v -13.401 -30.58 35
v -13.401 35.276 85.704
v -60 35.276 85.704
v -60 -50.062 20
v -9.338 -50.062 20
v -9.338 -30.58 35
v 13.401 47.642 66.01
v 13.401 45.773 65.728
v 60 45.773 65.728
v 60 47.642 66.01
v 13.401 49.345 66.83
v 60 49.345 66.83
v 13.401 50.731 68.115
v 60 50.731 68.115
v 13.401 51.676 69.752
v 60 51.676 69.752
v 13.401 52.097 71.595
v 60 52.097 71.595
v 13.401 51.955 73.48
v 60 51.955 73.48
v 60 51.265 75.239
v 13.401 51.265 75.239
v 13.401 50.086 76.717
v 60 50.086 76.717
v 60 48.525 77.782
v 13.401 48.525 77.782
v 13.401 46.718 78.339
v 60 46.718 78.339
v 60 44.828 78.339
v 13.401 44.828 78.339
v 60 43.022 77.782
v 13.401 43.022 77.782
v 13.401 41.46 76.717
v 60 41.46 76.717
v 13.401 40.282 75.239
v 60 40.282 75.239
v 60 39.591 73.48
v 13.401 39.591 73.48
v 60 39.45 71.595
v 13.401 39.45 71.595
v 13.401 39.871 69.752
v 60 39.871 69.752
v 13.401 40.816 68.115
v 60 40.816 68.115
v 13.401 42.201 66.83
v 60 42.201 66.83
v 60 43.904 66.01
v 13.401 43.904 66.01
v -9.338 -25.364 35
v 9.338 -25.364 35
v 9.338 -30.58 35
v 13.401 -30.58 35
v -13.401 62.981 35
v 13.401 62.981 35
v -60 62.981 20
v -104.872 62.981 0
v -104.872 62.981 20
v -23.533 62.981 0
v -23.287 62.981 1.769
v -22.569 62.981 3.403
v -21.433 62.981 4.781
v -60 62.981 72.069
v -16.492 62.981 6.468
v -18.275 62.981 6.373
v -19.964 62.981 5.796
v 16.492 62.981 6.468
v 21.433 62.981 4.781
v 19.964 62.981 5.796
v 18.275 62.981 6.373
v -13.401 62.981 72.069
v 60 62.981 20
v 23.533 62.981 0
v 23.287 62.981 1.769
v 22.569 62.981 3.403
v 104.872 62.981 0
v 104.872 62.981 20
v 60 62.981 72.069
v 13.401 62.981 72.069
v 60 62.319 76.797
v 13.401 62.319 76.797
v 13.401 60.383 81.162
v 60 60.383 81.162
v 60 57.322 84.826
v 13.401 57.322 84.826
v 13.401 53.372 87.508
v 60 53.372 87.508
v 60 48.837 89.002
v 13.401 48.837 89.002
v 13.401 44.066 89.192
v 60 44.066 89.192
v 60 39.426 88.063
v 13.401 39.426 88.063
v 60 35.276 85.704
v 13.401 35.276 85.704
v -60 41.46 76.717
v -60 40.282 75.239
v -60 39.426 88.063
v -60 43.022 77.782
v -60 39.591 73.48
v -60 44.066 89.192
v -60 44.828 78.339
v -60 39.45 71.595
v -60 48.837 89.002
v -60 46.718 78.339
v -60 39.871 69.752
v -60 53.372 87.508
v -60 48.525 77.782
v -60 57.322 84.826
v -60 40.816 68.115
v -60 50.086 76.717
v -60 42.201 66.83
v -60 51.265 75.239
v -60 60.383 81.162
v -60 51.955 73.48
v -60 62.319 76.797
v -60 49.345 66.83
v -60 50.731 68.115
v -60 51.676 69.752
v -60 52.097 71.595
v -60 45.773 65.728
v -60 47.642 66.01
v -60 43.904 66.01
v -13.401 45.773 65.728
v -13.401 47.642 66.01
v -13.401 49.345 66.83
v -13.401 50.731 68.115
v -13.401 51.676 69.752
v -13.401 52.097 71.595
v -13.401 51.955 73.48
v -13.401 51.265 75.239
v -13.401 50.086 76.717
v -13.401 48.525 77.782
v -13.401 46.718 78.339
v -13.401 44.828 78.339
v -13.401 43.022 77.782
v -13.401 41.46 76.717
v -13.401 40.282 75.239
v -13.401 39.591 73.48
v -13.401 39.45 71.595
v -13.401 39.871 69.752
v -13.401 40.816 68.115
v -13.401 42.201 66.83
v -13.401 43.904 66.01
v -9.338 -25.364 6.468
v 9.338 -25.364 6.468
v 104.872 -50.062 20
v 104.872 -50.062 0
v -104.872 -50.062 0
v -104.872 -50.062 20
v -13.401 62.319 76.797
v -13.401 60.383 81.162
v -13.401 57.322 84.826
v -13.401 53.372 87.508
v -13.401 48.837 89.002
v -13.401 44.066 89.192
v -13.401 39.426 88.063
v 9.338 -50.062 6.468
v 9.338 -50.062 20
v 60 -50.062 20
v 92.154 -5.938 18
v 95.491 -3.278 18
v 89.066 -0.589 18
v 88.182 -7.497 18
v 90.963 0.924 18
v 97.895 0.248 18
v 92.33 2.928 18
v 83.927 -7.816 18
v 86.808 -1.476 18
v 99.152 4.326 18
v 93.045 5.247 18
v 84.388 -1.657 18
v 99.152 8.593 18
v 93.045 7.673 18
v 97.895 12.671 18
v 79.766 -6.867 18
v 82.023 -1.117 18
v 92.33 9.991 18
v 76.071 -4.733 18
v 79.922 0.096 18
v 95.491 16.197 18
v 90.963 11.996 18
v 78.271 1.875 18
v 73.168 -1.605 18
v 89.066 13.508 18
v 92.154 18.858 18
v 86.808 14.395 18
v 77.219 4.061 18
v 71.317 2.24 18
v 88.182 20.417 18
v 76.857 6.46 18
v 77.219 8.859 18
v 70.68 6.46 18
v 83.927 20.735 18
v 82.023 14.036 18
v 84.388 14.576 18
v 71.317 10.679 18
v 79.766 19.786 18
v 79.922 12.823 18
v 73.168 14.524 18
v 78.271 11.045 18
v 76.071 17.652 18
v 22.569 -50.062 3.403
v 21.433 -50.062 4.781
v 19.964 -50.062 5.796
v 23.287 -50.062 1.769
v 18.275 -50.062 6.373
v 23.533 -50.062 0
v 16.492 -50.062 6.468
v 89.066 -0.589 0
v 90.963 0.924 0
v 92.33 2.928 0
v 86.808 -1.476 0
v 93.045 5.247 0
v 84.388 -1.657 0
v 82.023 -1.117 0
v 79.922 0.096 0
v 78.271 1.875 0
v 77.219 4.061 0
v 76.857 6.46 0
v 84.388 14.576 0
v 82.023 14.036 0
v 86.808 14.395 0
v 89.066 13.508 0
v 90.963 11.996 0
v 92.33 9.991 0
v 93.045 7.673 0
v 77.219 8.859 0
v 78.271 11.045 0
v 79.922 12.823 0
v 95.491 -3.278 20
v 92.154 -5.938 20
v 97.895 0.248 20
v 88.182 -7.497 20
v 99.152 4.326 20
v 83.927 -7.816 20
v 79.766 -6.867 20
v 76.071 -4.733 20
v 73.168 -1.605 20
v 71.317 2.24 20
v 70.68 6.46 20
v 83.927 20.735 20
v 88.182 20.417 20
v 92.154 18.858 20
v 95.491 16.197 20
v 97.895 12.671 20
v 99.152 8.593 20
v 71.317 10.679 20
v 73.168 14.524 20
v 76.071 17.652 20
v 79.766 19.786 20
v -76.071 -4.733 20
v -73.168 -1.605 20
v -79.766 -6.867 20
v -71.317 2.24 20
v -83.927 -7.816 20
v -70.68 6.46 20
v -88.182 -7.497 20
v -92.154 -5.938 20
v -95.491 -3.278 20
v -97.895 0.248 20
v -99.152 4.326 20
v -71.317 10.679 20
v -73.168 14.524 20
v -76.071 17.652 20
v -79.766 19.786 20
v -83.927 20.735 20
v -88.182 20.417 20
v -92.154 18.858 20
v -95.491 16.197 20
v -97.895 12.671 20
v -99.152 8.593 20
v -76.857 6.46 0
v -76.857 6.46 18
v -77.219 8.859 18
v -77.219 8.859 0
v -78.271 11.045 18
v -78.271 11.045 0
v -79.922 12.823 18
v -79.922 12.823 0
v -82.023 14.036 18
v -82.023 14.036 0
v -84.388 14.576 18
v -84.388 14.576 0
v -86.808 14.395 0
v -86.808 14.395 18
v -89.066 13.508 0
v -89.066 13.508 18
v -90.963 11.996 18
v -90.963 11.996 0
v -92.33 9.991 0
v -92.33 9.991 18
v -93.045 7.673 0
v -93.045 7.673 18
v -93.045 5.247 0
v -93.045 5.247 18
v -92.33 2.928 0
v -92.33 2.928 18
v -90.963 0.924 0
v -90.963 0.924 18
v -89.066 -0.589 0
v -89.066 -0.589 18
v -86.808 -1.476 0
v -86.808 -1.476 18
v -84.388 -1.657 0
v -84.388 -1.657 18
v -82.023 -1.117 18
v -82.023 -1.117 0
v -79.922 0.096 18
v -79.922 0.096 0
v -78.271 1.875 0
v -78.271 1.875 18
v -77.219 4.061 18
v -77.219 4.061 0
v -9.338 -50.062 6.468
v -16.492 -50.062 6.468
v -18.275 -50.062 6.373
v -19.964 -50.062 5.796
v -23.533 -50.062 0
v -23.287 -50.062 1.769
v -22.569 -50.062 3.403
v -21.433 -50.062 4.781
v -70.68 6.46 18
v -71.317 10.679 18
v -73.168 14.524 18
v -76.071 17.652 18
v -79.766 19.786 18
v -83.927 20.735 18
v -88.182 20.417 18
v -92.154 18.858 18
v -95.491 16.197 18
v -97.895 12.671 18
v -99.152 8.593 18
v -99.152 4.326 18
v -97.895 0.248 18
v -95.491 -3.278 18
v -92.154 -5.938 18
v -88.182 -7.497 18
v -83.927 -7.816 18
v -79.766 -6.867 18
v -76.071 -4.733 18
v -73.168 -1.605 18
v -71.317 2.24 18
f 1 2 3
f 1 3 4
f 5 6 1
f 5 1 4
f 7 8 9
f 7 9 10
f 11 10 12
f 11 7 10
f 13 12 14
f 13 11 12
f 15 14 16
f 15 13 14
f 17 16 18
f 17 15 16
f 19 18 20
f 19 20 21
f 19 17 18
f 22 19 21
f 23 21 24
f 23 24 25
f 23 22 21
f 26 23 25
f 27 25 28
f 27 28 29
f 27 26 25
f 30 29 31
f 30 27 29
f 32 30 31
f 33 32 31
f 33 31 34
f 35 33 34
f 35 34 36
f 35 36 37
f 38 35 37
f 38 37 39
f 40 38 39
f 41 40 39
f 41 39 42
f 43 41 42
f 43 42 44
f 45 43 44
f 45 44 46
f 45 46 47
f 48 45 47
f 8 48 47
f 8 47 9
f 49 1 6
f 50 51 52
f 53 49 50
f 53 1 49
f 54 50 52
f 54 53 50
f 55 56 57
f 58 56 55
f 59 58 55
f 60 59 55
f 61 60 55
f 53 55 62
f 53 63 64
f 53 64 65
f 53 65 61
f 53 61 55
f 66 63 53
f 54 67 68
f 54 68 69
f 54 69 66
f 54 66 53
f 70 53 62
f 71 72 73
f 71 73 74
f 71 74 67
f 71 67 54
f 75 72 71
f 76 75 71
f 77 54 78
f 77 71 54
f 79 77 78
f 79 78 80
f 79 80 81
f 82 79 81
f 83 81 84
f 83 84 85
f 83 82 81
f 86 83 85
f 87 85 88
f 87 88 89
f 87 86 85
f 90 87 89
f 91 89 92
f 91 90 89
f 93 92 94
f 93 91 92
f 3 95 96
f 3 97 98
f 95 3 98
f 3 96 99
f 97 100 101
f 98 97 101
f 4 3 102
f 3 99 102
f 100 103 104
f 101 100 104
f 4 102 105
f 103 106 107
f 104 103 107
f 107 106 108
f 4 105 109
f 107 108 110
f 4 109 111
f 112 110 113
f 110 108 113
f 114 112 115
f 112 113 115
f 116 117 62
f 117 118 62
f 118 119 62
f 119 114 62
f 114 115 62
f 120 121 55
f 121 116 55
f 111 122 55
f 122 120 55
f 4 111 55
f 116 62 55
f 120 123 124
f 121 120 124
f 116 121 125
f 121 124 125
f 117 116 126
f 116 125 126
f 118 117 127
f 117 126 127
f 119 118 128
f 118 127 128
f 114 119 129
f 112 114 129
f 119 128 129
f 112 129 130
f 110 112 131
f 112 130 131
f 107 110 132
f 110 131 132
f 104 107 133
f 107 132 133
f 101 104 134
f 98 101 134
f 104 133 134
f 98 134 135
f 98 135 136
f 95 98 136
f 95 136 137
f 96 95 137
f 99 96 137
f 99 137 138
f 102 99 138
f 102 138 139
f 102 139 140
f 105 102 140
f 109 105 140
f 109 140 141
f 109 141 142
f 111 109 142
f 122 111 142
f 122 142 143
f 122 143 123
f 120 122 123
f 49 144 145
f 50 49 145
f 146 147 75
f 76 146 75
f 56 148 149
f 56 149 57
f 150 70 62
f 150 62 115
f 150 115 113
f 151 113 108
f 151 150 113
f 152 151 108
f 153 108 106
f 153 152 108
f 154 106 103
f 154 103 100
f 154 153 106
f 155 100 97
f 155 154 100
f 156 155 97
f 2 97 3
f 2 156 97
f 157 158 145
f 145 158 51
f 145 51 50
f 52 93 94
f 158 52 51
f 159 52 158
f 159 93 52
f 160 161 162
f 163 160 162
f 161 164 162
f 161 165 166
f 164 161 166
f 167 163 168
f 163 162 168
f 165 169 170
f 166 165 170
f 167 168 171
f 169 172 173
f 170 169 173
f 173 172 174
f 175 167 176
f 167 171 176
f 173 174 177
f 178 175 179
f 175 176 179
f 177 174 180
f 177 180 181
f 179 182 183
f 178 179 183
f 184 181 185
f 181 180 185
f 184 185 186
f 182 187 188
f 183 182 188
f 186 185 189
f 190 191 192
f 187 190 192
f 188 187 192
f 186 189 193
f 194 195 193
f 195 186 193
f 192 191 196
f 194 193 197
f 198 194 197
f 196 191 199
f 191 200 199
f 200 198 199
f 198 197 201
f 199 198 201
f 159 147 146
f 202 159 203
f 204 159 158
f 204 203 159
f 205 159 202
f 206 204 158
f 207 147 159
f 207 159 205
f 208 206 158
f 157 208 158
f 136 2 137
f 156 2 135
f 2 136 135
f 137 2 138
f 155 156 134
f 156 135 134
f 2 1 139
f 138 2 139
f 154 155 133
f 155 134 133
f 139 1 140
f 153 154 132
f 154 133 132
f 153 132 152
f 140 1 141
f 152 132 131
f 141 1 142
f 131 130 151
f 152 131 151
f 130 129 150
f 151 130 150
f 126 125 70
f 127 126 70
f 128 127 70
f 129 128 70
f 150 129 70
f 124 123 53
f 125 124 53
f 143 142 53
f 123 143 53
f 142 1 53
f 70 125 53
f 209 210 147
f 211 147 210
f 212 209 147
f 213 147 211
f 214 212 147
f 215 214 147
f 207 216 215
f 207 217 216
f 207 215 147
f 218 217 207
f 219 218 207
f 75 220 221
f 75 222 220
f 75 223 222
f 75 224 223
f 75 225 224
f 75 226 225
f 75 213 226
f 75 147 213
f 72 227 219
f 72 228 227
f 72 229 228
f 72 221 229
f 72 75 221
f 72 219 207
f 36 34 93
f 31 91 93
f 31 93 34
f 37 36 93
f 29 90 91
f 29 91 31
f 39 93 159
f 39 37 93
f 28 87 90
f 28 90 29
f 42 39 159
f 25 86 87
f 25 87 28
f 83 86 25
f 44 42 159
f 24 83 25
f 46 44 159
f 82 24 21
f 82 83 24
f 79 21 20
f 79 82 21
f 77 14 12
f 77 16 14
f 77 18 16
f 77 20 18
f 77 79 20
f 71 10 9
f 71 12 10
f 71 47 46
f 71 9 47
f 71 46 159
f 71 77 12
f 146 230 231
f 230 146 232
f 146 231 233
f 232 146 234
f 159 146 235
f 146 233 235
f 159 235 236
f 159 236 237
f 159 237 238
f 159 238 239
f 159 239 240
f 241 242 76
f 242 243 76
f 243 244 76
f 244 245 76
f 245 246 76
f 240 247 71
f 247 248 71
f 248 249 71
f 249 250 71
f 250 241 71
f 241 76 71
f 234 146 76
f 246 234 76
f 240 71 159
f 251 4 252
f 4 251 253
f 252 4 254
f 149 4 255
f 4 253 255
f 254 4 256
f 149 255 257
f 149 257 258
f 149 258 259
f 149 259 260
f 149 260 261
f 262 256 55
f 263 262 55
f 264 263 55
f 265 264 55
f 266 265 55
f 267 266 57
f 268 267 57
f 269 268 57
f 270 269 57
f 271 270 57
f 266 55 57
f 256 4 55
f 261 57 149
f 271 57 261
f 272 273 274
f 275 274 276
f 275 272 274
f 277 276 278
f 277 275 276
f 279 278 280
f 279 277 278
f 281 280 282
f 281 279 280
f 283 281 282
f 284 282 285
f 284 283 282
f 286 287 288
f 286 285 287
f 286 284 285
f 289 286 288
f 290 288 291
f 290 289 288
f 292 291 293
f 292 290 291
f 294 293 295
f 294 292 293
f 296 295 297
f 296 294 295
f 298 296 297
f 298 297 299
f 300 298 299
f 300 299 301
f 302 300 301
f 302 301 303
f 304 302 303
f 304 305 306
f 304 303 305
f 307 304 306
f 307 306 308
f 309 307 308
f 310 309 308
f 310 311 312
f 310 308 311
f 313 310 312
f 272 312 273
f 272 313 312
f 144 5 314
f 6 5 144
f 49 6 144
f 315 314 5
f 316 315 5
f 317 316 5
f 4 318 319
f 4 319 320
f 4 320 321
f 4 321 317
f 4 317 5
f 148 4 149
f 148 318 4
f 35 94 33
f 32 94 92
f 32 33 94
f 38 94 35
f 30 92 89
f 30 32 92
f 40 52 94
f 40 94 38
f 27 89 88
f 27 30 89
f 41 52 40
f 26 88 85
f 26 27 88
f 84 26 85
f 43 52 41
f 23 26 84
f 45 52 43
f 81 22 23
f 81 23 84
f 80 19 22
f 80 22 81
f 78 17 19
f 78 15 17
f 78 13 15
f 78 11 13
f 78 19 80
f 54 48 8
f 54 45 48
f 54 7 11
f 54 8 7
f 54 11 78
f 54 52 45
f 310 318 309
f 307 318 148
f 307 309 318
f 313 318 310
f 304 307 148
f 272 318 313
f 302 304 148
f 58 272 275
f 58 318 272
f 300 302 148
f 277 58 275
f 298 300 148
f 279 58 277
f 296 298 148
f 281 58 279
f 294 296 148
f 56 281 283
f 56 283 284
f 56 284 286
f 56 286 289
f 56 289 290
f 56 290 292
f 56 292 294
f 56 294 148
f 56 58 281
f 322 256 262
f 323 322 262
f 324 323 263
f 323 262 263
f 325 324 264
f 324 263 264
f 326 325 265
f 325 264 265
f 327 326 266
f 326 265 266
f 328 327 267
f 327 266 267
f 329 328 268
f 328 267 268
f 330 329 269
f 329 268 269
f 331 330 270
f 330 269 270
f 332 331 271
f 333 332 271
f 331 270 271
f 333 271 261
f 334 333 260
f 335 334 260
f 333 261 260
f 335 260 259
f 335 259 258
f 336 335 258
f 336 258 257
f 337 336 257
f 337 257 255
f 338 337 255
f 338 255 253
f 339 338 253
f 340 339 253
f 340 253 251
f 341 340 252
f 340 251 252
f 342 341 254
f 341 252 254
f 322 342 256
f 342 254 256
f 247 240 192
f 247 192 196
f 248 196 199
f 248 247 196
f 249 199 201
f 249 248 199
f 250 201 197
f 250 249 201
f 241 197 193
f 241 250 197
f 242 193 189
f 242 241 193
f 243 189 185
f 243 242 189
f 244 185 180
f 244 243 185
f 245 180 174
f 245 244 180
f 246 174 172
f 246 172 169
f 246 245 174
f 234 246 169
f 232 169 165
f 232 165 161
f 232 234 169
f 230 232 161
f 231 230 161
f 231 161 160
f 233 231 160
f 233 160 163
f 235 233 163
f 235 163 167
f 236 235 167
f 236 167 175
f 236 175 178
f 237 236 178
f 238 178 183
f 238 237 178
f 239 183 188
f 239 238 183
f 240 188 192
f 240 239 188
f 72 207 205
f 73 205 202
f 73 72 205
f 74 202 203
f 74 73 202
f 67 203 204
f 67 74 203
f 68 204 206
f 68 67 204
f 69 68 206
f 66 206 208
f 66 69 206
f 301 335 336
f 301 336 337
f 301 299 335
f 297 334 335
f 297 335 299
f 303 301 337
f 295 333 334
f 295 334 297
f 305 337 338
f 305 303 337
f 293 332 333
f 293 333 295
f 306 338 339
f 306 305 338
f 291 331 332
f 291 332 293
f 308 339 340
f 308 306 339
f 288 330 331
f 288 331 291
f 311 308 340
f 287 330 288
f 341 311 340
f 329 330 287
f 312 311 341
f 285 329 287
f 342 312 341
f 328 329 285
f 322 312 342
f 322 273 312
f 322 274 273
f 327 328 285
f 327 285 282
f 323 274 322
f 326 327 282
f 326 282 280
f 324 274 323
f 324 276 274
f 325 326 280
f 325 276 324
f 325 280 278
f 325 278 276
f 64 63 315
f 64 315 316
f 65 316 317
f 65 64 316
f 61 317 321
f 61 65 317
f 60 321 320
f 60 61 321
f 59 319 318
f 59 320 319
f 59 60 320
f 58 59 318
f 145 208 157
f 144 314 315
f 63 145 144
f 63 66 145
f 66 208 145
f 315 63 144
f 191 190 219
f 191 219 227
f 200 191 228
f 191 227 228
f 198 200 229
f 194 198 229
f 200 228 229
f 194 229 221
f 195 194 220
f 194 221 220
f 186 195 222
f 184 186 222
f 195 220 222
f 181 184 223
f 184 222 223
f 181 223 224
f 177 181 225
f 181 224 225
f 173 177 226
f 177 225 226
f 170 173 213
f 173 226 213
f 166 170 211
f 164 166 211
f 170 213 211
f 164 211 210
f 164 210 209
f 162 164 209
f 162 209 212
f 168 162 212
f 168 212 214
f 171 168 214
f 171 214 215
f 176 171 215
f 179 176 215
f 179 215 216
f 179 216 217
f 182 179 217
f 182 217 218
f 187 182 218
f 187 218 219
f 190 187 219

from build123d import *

# Parameters (mm, degrees)
SZKIC1_W                    = 104.872117299
SZKIC1_H                    = 113.043153049
SZKIC1_R                    = 8.139229877
DODANIE_WYCI_GNI_CIE1_DEPTH = 20
SZKIC2_R                    = 14.315912416
WYTNIJ_WYCI_GNI_CIE1_DEPTH  = 2
WYTNIJ_WYCI_GNI_CIE2_DEPTH  = 140
SZKIC9_R                    = 6.34096602
DODANIE_WYCI_GNI_CIE2_DEPTH = 60
SZKIC12_W                   = 26.801545634
SZKIC12_H                   = 113.043153049
WYTNIJ_WYCI_GNI_CIE8_DEPTH  = 99
SZKIC13_W                   = 18.676589494
SZKIC13_H                   = 43.251049354
WYTNIJ_WYCI_GNI_CIE9_DEPTH  = 85


with BuildPart() as part:
    # Szkic1 → Dodanie-wyciągnięcie1 (new body)
    with BuildSketch(Plane.XY):
        with Locations((-52.43605865, 6.459608746)):
            Rectangle(SZKIC1_W, SZKIC1_H)
        with Locations((-84.996398081, 6.459608746)):
            Circle(SZKIC1_R, mode=Mode.SUBTRACT)
    dodanie_wyci_gni_cie1 = extrude(amount=DODANIE_WYCI_GNI_CIE1_DEPTH)

    # Szkic2 → Wytnij-wyciągnięcie1 (cut)
    with BuildSketch(Plane.XY.offset(20)):
        with Locations((-84.996398081, 6.459608746)):
            Circle(SZKIC2_R)
    wytnij_wyci_gni_cie1 = extrude(amount=-WYTNIJ_WYCI_GNI_CIE1_DEPTH, mode=Mode.SUBTRACT)

    # Lustro2: Dodanie-wyciągnięcie1, Wytnij-wyciągnięcie1 across plane
    add(dodanie_wyci_gni_cie1.mirror(Plane(origin=(0, 62.98118527, 20), x_dir=(0, 0, 1), z_dir=(-1, 0, 0))))
    add(wytnij_wyci_gni_cie1.mirror(Plane(origin=(0, 62.98118527, 20), x_dir=(0, 0, 1), z_dir=(-1, 0, 0))), mode=Mode.SUBTRACT)

    # Szkic6 → Wytnij-wyciągnięcie2 (cut)
    with BuildSketch(Plane(origin=(0, 62.98118527, 0), x_dir=(1, 0, 0), z_dir=(0, 1, 0))):
        with BuildLine():
            Line((-23.533046442, 0), (23.533046442, 0))
            ThreePointArc((23.533046442, 0), (21.432956346, -4.78054627), (16.491575681, -6.467780152))
            Line((16.491575681, -6.467780152), (-16.491575681, -6.467780152))
            ThreePointArc((-16.491575681, -6.467780152), (-21.432956346, -4.78054627), (-23.533046442, 0))
        make_face()
    extrude(amount=-WYTNIJ_WYCI_GNI_CIE2_DEPTH, mode=Mode.SUBTRACT)

    # Szkic9 → Dodanie-wyciągnięcie2 (add)
    with BuildSketch(Plane(origin=(0, 0, 0), x_dir=(0, 0, -1), z_dir=(1, 0, 0))):
        with BuildLine():
            Line((-20, 62.98118527), (-72.068850924, 62.98118527))
            ThreePointArc((-72.068850924, 62.98118527), (-87.508244639, 53.371610982), (-85.703573327, 35.27570101))
            Line((-85.703573327, 35.27570101), (-20, -50.061967779))
            Line((-20, -50.061967779), (-20, 62.98118527))
        make_face()
        with Locations((-72.068850924, 45.773409652)):
            Circle(SZKIC9_R, mode=Mode.SUBTRACT)
    dodanie_wyci_gni_cie2 = extrude(amount=DODANIE_WYCI_GNI_CIE2_DEPTH)

    # Lustro3: Dodanie-wyciągnięcie2 across plane
    add(dodanie_wyci_gni_cie2.mirror(Plane(origin=(0, 45.773409652, 72.068850924), x_dir=(0, 0, 1), z_dir=(1, 0, 0))))

    # Szkic12 → Wytnij-wyciągnięcie8 (cut)
    with BuildSketch(Plane.XY.offset(35)):
        with Locations((0, 6.459608746)):
            Rectangle(SZKIC12_W, SZKIC12_H)
    extrude(amount=WYTNIJ_WYCI_GNI_CIE8_DEPTH, mode=Mode.SUBTRACT)

    # Szkic13 → Wytnij-wyciągnięcie9 (cut)
    with BuildSketch(Plane.XY.offset(35)):
        with Locations((0, -46.989841451)):
            Rectangle(SZKIC13_W, SZKIC13_H)
    extrude(amount=-WYTNIJ_WYCI_GNI_CIE9_DEPTH, mode=Mode.SUBTRACT)


solid = part.part
